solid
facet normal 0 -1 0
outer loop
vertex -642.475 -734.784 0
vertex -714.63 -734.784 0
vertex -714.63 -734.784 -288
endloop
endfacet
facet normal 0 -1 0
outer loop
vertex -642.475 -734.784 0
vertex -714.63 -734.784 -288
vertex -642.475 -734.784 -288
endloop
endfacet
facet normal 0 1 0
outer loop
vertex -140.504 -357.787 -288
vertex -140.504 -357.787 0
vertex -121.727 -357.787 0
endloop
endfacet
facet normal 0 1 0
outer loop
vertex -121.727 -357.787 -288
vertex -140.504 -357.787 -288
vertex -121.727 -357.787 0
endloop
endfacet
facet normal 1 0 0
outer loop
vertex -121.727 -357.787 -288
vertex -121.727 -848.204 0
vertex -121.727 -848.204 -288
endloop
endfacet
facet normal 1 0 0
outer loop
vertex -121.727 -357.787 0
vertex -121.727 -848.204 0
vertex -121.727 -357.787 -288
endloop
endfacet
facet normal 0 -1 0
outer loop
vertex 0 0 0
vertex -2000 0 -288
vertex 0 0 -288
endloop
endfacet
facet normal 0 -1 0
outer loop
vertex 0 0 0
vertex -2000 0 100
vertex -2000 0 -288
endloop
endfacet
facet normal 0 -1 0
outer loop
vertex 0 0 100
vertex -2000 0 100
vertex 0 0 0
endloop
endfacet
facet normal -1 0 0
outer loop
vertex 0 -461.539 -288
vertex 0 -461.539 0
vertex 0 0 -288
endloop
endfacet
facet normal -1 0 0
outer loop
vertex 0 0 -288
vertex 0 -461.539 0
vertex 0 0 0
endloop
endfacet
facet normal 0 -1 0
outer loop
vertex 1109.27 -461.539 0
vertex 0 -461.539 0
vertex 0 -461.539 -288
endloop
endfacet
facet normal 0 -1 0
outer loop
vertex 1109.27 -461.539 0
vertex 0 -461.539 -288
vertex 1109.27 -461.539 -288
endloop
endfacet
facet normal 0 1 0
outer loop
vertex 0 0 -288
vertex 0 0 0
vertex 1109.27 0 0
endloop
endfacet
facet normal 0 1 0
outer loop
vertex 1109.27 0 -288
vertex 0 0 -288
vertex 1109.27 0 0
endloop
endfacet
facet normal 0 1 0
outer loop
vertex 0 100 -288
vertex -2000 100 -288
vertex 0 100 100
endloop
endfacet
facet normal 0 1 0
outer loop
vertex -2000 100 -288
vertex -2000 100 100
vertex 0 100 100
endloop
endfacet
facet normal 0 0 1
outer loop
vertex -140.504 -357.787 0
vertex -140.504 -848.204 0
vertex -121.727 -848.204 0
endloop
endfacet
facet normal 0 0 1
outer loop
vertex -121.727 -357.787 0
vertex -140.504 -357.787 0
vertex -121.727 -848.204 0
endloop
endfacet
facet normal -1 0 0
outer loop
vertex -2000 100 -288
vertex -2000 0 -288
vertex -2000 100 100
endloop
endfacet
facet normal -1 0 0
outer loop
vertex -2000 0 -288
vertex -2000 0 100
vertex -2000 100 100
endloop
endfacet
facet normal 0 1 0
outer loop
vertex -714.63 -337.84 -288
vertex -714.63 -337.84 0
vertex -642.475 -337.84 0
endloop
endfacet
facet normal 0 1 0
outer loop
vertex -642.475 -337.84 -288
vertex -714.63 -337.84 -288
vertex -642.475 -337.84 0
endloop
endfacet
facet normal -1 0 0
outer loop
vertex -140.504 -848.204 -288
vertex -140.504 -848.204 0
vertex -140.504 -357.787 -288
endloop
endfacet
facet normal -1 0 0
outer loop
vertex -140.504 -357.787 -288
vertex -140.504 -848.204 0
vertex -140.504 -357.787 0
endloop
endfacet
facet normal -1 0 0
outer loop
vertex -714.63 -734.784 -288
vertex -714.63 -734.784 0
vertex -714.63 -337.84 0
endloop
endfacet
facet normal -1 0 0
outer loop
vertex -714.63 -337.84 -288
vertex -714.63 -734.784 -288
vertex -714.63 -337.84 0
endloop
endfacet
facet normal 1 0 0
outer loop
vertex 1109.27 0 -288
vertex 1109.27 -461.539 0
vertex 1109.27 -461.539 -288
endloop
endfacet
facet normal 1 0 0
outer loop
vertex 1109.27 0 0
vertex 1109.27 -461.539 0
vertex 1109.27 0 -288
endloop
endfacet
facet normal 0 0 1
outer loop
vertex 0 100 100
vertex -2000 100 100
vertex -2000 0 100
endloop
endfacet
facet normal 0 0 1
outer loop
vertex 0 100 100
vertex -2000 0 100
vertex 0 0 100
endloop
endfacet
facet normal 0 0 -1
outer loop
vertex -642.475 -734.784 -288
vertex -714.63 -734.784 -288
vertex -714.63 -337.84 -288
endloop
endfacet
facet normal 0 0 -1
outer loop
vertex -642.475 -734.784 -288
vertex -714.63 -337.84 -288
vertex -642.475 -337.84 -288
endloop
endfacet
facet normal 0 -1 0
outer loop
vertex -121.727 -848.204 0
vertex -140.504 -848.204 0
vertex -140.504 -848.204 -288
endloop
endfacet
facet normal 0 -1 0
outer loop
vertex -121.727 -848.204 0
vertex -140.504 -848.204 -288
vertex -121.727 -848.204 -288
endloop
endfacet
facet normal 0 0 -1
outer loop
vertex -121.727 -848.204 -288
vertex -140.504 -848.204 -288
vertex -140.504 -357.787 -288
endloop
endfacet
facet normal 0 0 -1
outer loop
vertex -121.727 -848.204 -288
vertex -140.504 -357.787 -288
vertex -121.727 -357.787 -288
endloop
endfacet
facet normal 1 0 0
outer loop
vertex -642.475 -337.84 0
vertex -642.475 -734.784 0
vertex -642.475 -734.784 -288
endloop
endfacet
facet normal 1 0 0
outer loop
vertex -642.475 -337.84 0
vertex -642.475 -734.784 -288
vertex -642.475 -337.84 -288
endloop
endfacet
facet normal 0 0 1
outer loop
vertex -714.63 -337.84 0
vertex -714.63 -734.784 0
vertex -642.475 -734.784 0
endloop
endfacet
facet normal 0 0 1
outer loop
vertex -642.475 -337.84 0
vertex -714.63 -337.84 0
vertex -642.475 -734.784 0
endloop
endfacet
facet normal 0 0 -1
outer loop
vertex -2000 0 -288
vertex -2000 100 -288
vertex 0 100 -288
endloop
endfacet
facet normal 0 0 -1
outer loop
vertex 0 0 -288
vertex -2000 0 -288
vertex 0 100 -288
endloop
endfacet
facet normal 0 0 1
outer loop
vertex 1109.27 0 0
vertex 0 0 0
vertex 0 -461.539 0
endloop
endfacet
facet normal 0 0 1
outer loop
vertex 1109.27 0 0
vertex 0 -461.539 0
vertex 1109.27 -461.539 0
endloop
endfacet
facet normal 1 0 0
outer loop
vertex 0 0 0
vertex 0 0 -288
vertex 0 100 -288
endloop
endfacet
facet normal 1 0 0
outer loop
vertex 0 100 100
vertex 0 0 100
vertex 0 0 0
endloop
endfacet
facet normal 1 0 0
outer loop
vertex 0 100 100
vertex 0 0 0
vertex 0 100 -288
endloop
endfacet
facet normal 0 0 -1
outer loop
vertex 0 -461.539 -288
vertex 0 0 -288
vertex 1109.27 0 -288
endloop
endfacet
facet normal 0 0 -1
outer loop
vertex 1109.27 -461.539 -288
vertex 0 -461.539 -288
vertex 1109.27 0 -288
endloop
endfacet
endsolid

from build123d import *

# Parameters (mm, degrees)
F0_W     = 2000
F0_H     = 100
F1_DEPTH = 100
F0_W_2   = 1109.2703342438
F0_H_2   = 461.539208889
F2_DEPTH = 288
F0_W_3   = 72.1554160118
F0_H_3   = 396.9436585903
F0_W_4   = 18.7770649791
F0_H_4   = 490.4179871082


with BuildPart() as f1:
    # F0 (on Top) → F1 (new body)
    with BuildSketch(Plane.XY):
        with Locations((-1000, 50)):
            Rectangle(F0_W, F0_H)
    extrude(amount=F1_DEPTH)

    # F0 (on Top) → F2 (join)
    with BuildSketch(Plane.XY):
        with Locations((554.6351671219, -230.7696044445)):
            Rectangle(F0_W_2, F0_H_2)
        with Locations((-1000, 50)):
            Rectangle(F0_W, F0_H)
    extrude(amount=-F2_DEPTH)


with BuildPart() as f2:
    # F0 (on Top) → F2, piece 2 (new body)
    with BuildSketch(Plane.XY):
        with Locations((-678.5522401333, -536.3117009401)):
            Rectangle(F0_W_3, F0_H_3)
    extrude(amount=-F2_DEPTH)


with BuildPart() as f2b:
    # F0 (on Top) → F2, piece 3 (new body)
    with BuildSketch(Plane.XY):
        with Locations((-131.1154998839, -602.9954999685)):
            Rectangle(F0_W_4, F0_H_4)
    extrude(amount=-F2_DEPTH)


solid = Compound([f1.part, f2.part, f2b.part])
